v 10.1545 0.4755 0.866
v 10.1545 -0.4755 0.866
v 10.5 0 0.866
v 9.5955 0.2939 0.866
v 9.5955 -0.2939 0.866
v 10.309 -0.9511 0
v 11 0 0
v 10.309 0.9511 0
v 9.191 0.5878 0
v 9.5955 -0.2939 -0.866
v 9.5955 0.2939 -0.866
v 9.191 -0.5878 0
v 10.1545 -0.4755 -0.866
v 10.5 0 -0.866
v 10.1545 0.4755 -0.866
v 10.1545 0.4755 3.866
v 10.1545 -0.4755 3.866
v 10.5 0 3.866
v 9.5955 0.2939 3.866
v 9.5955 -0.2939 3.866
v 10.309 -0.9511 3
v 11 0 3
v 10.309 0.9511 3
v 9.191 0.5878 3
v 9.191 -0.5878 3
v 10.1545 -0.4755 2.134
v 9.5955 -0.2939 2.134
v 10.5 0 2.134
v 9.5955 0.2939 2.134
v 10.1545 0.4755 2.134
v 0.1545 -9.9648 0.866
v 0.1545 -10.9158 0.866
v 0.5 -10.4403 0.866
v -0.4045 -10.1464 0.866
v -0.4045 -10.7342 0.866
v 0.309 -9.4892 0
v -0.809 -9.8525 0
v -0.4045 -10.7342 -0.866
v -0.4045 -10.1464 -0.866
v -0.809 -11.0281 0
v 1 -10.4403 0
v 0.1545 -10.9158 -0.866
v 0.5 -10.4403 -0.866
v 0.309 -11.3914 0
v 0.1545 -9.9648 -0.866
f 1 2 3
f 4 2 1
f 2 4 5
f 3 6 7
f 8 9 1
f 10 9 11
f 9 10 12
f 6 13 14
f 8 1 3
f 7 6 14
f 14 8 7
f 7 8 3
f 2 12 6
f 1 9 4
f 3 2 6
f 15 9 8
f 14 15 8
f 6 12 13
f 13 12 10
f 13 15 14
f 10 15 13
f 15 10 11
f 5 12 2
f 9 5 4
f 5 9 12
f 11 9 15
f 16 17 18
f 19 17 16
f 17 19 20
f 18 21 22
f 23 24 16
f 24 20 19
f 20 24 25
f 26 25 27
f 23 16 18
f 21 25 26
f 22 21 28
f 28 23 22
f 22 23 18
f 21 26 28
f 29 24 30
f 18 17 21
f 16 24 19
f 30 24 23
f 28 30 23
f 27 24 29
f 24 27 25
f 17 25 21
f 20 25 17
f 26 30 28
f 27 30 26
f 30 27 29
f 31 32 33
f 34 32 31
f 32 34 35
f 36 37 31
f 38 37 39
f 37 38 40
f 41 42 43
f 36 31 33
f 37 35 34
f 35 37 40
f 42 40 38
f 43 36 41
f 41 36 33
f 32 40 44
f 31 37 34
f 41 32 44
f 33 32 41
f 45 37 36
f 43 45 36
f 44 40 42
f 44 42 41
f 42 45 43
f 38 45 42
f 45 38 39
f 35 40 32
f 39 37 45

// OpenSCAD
// file: lib-list.scad
// functions on arbitrary lists

// utilities on arbitrary vectors
function cdr(vec) = [for(i=[1:1:len(vec)-1]) vec[i]];
function reverse(vec) = (
    len(vec) == 0 ? vec :
    concat(reverse(cdr(vec)), vec[0])
);

// remove all of an item from a list by value
function remove(list, bad) = (
    list == [] ? list :
    list[0] == bad ? remove(cdr(list), bad) :
    [list[0], each remove(cdr(list), bad)]
);

// return all items in list for which f returns true
function filter(list, f) = (
    list == [] ? list :
    !f(list[0]) ? filter(cdr(list)) :
    [list[0], each filter(cdr(list), bad)]
);

// find the highest something in a list using the provided comparator
function select(list, comp, highest) = (
    list == [] ? highest :
    comp(highest, list[0]) > 0 ? select(cdr(list), comp, highest) :
    select(cdr(list), comp, list[0])
);
// selection sort a list using a comparator (which should return a number for how the first arg sorts to the second)
function sort(list, comp, acc) = (
    list == [] ? acc :
    sort(remove(list, select(list, comp, undef)), comp, [select(list, comp, undef), each acc])
);

// tell whether a list contains all elements of another list
function contains(L, elts) = (
    len(elts) == 0 ? true :
    len(L) == 0 ? false :
    len(elts) == 1 ? 
        L[0] == elts[0] ? true : contains(cdr(L), elts)
    : contains(L, [elts[0]]) && contains(L, cdr(elts))
);

// join two lists, taking only one copy of any duplicates
function merge(L1, L2, acc) = 
    L1 == [] && L2 == [] ? acc :
    L1 == [] ? [each acc, each L2] :
    L2 == [] ? [each acc, each L1] :
    contains(L2, [L1[0]]) ? merge(cdr(L1), remove(L2, L1[0]), [each acc, L1[0]]) :
    merge(cdr(L1), L2, [each acc, L1[0]]);

// find all the indices where x appears in L
function index(L, x, acc=[0], margin=0) = (
    len(L) == 0 ? cdr(acc) : // trim off the counter
    distance(L[0], x) <= margin ? index(cdr(L), x, concat(acc[0]+1, acc)) : // save the current index
    index(cdr(L), x, concat(acc[0]+1, cdr(acc))) // increase the counter
);
// file: lib-math.scad
// functions to deal with scalars

include <lib-list.scad>


// identity function
id = function(x) x;

// mod that deals with negatives correctly
function mod(a,b) = (a % b + b) % b;

// Euclid's algorithm
function gcd(a,b) = 
    a<b ? gcd(b,a) :
    b==0 ? a : 
    gcd(b, a%b);

// sum a list of numbers
function sum(L) = 
    L == [] ? 0 :
    is_num(L[0]) ? L[0] + sum(cdr(L)) :
    sum(cdr(L));

// don't give arguments more than 15
function nybble(n) = n < 10 ? str(floor(n)) : chr(floor(n)+55);
// don't give arguments outside unsigned byte range
function byte(n) = 
    n > 255 ? "FF" : 
    n < 0 ? "00" : 
    n < 16 ? str("0", nybble(n)) : 
    hex(n);

// convert number to hexadecimal string
function hex(n) = 
    !is_num(n) ? n : 
    n < 16 ? nybble(n) :
    str(hex(n / 16), nybble(n % 16));

// find the angle of an arc given length and radius
function angle(arclength, radius) = arclength / (radius * 2 * PI) * 360;

// functions to deal with vectors

// standard basis vectors in R3
i3 = [1, 0, 0];
j3 = [0, 1, 0];
k3 = [0, 0, 1];

// zero vector in Rn
function vec_0(n) = [for(i=[0:1:n-1]) 0];

// average of two vectors
function vec_avg(a,b) = (a + b) / 2;

// polar angle (argument) of a vector in R2
function vec_ang(a) = atan2(a.y, a.x);

// dot product of two vectors in Rn
// set strict = true to fail when len(a) != len(b)
function dot(a, b, strict = false) = 
    strict && len(a) != len(b) ? undef :
    a == [] || b == [] ? 0 :
    a[0] * b[0] + dot(cdr(a), cdr(b));

// cross product of two vectors in R3
function cross(a, b) = [a.y * b.z - a.z * b.y, a.z * b.x - a.x * b.z, a.x * a.y - a.y * a.x];

// rotate in xy plane
function vec_rot(a,t) = [a.x * cos(t) - a.y * sin(t), a.y * cos(t) + a.x * sin(t), each(cdr(cdr(a)))];

// distance between two vectors in Rd
function distance(a,b) = sqrt(distsq(a, b));

// distance squared between two vectors in Rd
function distsq(a, b) =
    is_num(a) ? pow(a - b, 2) : 
    len(a) == 0 ? 0 :
    pow(a[0] - b[0], 2) + distsq(cdr(a), cdr(b));

// distance between polar points in R x [0,360)
function dist_polar(a, b) = 
    let(
        c = [a[0] * cos(a[1]), a[0] * sin(a[1])],
        d = [b[0] * cos(b[1]), b[0] * sin(b[1])])
    distance(c,d);

// compare the distance between two vectors in Rd
function dist_comp(a,b) = (is_undef(a) || is_undef(b)) ? 0 : distance(a[0], a[1]) - distance(b[0], b[1]);

// calculate the length of a parametric function f : [0:360] -> R2 with resolution dt
function length(f, dt) = 
    sum([for(t=[0:360:dt]) 
        let(t0 = t, t1 = t + dt)
        distance(f(t0), f(t1))
    ]);

// polar angle bac in (-180,180] in xy plane
function subtend(a,b,c) = (function(b,c) vec_ang(vec_rot(c, -atan2(b.y, b.x)))) (b-a, c-a);

// comparators for x, y, and z coordinates of vectors in R3
x_comp = function (a,b)
    is_undef(a) || is_undef(b) ? 0 :
    a.x > b.x ? 1 :
    a.x < b.x ? -1 :
    a.y > b.y ? 1 :
    a.y < b.y ? -1 :
    a.z > b.z ? 1 :
    a.z < b.z ? -1 :
    0;
y_comp = function (a,b)
    is_undef(a) || is_undef(b) ? 0 :
    a.y > b.y ? 1 :
    a.y < b.y ? -1 :
    a.x > b.x ? 1 :
    a.x < b.x ? -1 :
    a.z > b.z ? 1 :
    a.z < b.z ? -1 :
    0;
z_comp = function (a,b)
    is_undef(a) || is_undef(b) ? 0 :
    a.z > b.z ? 1 :
    a.z < b.z ? -1 :
    a.x > b.x ? 1 :
    a.x < b.x ? -1 :
    a.y > b.y ? 1 :
    a.y < b.y ? -1 :
    0;

// create a list of every unique sum of vectors in a list
function allsum(vecs) = 
    len(vecs) <= 1 ? vecs :
    let(rest=allsum(cdr(vecs)))
    merge(
        merge(vecs, rest), 
        merge([for(v=rest) vecs[0] + v], [for(v=cdr(vecs)) vecs[0] + v])
    );
    
// functions on matrices

// set the value at row i, column j in matrix to val
function mat_insert(matrix, i,j, val) = [for(a=[0:1:len(matrix)-1]) a==i ? [for(b=[0:1:len(matrix[i])-1]) b==j ? val : matrix[i][b]] : matrix[a]];

// nxn identity matrix
function mat_i(n) = [for(i=[1:1:n]) [for(j=[1:1:n]) i == j ? 1 : 0]];

// multiply two matrices
// a[i][j] where i is row (up/down), j is column (right/left)
// len(a[0]) == len(b) so width of a == height of b, and len(ab)=len(a) and len(ab[0]) = len(b[0])
function mat_mult(a, b) = 
    [for(i = [0:1:len(a)-1])
        [for(j = [0:1:len(b[0])-1])
            sum([for(k = [0:1:len(a[0])-1]) 
                a[i][k] * b[k][j]
            ])
        ]
    ];

// matrix product of multiple matrices
function mat_prod(mats) = 
    len(mats) == 1 ? mats[0] :
    mat_mult(mats[0], mat_prod(cdr(mats)));

// apply a linear map (matrix) to a vector in R3
function mat_apply(A, x) = 
    let(v = mat_mult(A, [[x.x], [x.y], [x.z]]))
    [v[0][0], v[1][0], v[2][0]];

// matrix inverse of a 3x3 matrix (formula stolen from Wolfram Alpha)
function mat_inv(A) = 
    let(a = A[0][0], b = A[0][1], c = A[0][2], 
        d = A[1][0], e = A[1][1], f = A[1][2],
        g = A[2][0], h = A[2][1], i = A[2][2])
    let(stuff = a * e * i - a * f * h - b * d * i + b * f * g + c * d * h - c * e * g)
    stuff == 0 ? undef : 
    [[e * i - f * h, c * h - b * i, b * f - c * e],
    [f * g - d * i, a * i - c * g, c * d - a * f],
    [d * h - e * g, b * g - a * h, a * e - b * d]]
    / stuff;
// main file
// tests for lib-draw
// animate tests 24 fps 90 steps
include <lib-draw.scad>

module align_test() {
    t = $t * 360;
    v1 = [cos(t), sin(t), 0] * 10;
    a = 9;
    v2 = v1 + [sin(t * a), 0, cos(t * a)] * 3;
    translate(v1) sphere(1);
    translate(v2) sphere(1);
    translate(mat_apply(align(v1, v2), v2)) sphere(1);
}

module follow_test() {
    f = function(t) [cos(t * 360), 4 * t, sin(t * 360)];
    n = 100;
    a = follow(f, n, []);
    for(t=[0:1:n]) {
        translate(f(t / n) * 30) hull() {
            sphere(1);
            echo(a[t]);
            translate(mat_apply(a[t], [0, 0, 10])) sphere(1);
        }
    }
}

align_test();
